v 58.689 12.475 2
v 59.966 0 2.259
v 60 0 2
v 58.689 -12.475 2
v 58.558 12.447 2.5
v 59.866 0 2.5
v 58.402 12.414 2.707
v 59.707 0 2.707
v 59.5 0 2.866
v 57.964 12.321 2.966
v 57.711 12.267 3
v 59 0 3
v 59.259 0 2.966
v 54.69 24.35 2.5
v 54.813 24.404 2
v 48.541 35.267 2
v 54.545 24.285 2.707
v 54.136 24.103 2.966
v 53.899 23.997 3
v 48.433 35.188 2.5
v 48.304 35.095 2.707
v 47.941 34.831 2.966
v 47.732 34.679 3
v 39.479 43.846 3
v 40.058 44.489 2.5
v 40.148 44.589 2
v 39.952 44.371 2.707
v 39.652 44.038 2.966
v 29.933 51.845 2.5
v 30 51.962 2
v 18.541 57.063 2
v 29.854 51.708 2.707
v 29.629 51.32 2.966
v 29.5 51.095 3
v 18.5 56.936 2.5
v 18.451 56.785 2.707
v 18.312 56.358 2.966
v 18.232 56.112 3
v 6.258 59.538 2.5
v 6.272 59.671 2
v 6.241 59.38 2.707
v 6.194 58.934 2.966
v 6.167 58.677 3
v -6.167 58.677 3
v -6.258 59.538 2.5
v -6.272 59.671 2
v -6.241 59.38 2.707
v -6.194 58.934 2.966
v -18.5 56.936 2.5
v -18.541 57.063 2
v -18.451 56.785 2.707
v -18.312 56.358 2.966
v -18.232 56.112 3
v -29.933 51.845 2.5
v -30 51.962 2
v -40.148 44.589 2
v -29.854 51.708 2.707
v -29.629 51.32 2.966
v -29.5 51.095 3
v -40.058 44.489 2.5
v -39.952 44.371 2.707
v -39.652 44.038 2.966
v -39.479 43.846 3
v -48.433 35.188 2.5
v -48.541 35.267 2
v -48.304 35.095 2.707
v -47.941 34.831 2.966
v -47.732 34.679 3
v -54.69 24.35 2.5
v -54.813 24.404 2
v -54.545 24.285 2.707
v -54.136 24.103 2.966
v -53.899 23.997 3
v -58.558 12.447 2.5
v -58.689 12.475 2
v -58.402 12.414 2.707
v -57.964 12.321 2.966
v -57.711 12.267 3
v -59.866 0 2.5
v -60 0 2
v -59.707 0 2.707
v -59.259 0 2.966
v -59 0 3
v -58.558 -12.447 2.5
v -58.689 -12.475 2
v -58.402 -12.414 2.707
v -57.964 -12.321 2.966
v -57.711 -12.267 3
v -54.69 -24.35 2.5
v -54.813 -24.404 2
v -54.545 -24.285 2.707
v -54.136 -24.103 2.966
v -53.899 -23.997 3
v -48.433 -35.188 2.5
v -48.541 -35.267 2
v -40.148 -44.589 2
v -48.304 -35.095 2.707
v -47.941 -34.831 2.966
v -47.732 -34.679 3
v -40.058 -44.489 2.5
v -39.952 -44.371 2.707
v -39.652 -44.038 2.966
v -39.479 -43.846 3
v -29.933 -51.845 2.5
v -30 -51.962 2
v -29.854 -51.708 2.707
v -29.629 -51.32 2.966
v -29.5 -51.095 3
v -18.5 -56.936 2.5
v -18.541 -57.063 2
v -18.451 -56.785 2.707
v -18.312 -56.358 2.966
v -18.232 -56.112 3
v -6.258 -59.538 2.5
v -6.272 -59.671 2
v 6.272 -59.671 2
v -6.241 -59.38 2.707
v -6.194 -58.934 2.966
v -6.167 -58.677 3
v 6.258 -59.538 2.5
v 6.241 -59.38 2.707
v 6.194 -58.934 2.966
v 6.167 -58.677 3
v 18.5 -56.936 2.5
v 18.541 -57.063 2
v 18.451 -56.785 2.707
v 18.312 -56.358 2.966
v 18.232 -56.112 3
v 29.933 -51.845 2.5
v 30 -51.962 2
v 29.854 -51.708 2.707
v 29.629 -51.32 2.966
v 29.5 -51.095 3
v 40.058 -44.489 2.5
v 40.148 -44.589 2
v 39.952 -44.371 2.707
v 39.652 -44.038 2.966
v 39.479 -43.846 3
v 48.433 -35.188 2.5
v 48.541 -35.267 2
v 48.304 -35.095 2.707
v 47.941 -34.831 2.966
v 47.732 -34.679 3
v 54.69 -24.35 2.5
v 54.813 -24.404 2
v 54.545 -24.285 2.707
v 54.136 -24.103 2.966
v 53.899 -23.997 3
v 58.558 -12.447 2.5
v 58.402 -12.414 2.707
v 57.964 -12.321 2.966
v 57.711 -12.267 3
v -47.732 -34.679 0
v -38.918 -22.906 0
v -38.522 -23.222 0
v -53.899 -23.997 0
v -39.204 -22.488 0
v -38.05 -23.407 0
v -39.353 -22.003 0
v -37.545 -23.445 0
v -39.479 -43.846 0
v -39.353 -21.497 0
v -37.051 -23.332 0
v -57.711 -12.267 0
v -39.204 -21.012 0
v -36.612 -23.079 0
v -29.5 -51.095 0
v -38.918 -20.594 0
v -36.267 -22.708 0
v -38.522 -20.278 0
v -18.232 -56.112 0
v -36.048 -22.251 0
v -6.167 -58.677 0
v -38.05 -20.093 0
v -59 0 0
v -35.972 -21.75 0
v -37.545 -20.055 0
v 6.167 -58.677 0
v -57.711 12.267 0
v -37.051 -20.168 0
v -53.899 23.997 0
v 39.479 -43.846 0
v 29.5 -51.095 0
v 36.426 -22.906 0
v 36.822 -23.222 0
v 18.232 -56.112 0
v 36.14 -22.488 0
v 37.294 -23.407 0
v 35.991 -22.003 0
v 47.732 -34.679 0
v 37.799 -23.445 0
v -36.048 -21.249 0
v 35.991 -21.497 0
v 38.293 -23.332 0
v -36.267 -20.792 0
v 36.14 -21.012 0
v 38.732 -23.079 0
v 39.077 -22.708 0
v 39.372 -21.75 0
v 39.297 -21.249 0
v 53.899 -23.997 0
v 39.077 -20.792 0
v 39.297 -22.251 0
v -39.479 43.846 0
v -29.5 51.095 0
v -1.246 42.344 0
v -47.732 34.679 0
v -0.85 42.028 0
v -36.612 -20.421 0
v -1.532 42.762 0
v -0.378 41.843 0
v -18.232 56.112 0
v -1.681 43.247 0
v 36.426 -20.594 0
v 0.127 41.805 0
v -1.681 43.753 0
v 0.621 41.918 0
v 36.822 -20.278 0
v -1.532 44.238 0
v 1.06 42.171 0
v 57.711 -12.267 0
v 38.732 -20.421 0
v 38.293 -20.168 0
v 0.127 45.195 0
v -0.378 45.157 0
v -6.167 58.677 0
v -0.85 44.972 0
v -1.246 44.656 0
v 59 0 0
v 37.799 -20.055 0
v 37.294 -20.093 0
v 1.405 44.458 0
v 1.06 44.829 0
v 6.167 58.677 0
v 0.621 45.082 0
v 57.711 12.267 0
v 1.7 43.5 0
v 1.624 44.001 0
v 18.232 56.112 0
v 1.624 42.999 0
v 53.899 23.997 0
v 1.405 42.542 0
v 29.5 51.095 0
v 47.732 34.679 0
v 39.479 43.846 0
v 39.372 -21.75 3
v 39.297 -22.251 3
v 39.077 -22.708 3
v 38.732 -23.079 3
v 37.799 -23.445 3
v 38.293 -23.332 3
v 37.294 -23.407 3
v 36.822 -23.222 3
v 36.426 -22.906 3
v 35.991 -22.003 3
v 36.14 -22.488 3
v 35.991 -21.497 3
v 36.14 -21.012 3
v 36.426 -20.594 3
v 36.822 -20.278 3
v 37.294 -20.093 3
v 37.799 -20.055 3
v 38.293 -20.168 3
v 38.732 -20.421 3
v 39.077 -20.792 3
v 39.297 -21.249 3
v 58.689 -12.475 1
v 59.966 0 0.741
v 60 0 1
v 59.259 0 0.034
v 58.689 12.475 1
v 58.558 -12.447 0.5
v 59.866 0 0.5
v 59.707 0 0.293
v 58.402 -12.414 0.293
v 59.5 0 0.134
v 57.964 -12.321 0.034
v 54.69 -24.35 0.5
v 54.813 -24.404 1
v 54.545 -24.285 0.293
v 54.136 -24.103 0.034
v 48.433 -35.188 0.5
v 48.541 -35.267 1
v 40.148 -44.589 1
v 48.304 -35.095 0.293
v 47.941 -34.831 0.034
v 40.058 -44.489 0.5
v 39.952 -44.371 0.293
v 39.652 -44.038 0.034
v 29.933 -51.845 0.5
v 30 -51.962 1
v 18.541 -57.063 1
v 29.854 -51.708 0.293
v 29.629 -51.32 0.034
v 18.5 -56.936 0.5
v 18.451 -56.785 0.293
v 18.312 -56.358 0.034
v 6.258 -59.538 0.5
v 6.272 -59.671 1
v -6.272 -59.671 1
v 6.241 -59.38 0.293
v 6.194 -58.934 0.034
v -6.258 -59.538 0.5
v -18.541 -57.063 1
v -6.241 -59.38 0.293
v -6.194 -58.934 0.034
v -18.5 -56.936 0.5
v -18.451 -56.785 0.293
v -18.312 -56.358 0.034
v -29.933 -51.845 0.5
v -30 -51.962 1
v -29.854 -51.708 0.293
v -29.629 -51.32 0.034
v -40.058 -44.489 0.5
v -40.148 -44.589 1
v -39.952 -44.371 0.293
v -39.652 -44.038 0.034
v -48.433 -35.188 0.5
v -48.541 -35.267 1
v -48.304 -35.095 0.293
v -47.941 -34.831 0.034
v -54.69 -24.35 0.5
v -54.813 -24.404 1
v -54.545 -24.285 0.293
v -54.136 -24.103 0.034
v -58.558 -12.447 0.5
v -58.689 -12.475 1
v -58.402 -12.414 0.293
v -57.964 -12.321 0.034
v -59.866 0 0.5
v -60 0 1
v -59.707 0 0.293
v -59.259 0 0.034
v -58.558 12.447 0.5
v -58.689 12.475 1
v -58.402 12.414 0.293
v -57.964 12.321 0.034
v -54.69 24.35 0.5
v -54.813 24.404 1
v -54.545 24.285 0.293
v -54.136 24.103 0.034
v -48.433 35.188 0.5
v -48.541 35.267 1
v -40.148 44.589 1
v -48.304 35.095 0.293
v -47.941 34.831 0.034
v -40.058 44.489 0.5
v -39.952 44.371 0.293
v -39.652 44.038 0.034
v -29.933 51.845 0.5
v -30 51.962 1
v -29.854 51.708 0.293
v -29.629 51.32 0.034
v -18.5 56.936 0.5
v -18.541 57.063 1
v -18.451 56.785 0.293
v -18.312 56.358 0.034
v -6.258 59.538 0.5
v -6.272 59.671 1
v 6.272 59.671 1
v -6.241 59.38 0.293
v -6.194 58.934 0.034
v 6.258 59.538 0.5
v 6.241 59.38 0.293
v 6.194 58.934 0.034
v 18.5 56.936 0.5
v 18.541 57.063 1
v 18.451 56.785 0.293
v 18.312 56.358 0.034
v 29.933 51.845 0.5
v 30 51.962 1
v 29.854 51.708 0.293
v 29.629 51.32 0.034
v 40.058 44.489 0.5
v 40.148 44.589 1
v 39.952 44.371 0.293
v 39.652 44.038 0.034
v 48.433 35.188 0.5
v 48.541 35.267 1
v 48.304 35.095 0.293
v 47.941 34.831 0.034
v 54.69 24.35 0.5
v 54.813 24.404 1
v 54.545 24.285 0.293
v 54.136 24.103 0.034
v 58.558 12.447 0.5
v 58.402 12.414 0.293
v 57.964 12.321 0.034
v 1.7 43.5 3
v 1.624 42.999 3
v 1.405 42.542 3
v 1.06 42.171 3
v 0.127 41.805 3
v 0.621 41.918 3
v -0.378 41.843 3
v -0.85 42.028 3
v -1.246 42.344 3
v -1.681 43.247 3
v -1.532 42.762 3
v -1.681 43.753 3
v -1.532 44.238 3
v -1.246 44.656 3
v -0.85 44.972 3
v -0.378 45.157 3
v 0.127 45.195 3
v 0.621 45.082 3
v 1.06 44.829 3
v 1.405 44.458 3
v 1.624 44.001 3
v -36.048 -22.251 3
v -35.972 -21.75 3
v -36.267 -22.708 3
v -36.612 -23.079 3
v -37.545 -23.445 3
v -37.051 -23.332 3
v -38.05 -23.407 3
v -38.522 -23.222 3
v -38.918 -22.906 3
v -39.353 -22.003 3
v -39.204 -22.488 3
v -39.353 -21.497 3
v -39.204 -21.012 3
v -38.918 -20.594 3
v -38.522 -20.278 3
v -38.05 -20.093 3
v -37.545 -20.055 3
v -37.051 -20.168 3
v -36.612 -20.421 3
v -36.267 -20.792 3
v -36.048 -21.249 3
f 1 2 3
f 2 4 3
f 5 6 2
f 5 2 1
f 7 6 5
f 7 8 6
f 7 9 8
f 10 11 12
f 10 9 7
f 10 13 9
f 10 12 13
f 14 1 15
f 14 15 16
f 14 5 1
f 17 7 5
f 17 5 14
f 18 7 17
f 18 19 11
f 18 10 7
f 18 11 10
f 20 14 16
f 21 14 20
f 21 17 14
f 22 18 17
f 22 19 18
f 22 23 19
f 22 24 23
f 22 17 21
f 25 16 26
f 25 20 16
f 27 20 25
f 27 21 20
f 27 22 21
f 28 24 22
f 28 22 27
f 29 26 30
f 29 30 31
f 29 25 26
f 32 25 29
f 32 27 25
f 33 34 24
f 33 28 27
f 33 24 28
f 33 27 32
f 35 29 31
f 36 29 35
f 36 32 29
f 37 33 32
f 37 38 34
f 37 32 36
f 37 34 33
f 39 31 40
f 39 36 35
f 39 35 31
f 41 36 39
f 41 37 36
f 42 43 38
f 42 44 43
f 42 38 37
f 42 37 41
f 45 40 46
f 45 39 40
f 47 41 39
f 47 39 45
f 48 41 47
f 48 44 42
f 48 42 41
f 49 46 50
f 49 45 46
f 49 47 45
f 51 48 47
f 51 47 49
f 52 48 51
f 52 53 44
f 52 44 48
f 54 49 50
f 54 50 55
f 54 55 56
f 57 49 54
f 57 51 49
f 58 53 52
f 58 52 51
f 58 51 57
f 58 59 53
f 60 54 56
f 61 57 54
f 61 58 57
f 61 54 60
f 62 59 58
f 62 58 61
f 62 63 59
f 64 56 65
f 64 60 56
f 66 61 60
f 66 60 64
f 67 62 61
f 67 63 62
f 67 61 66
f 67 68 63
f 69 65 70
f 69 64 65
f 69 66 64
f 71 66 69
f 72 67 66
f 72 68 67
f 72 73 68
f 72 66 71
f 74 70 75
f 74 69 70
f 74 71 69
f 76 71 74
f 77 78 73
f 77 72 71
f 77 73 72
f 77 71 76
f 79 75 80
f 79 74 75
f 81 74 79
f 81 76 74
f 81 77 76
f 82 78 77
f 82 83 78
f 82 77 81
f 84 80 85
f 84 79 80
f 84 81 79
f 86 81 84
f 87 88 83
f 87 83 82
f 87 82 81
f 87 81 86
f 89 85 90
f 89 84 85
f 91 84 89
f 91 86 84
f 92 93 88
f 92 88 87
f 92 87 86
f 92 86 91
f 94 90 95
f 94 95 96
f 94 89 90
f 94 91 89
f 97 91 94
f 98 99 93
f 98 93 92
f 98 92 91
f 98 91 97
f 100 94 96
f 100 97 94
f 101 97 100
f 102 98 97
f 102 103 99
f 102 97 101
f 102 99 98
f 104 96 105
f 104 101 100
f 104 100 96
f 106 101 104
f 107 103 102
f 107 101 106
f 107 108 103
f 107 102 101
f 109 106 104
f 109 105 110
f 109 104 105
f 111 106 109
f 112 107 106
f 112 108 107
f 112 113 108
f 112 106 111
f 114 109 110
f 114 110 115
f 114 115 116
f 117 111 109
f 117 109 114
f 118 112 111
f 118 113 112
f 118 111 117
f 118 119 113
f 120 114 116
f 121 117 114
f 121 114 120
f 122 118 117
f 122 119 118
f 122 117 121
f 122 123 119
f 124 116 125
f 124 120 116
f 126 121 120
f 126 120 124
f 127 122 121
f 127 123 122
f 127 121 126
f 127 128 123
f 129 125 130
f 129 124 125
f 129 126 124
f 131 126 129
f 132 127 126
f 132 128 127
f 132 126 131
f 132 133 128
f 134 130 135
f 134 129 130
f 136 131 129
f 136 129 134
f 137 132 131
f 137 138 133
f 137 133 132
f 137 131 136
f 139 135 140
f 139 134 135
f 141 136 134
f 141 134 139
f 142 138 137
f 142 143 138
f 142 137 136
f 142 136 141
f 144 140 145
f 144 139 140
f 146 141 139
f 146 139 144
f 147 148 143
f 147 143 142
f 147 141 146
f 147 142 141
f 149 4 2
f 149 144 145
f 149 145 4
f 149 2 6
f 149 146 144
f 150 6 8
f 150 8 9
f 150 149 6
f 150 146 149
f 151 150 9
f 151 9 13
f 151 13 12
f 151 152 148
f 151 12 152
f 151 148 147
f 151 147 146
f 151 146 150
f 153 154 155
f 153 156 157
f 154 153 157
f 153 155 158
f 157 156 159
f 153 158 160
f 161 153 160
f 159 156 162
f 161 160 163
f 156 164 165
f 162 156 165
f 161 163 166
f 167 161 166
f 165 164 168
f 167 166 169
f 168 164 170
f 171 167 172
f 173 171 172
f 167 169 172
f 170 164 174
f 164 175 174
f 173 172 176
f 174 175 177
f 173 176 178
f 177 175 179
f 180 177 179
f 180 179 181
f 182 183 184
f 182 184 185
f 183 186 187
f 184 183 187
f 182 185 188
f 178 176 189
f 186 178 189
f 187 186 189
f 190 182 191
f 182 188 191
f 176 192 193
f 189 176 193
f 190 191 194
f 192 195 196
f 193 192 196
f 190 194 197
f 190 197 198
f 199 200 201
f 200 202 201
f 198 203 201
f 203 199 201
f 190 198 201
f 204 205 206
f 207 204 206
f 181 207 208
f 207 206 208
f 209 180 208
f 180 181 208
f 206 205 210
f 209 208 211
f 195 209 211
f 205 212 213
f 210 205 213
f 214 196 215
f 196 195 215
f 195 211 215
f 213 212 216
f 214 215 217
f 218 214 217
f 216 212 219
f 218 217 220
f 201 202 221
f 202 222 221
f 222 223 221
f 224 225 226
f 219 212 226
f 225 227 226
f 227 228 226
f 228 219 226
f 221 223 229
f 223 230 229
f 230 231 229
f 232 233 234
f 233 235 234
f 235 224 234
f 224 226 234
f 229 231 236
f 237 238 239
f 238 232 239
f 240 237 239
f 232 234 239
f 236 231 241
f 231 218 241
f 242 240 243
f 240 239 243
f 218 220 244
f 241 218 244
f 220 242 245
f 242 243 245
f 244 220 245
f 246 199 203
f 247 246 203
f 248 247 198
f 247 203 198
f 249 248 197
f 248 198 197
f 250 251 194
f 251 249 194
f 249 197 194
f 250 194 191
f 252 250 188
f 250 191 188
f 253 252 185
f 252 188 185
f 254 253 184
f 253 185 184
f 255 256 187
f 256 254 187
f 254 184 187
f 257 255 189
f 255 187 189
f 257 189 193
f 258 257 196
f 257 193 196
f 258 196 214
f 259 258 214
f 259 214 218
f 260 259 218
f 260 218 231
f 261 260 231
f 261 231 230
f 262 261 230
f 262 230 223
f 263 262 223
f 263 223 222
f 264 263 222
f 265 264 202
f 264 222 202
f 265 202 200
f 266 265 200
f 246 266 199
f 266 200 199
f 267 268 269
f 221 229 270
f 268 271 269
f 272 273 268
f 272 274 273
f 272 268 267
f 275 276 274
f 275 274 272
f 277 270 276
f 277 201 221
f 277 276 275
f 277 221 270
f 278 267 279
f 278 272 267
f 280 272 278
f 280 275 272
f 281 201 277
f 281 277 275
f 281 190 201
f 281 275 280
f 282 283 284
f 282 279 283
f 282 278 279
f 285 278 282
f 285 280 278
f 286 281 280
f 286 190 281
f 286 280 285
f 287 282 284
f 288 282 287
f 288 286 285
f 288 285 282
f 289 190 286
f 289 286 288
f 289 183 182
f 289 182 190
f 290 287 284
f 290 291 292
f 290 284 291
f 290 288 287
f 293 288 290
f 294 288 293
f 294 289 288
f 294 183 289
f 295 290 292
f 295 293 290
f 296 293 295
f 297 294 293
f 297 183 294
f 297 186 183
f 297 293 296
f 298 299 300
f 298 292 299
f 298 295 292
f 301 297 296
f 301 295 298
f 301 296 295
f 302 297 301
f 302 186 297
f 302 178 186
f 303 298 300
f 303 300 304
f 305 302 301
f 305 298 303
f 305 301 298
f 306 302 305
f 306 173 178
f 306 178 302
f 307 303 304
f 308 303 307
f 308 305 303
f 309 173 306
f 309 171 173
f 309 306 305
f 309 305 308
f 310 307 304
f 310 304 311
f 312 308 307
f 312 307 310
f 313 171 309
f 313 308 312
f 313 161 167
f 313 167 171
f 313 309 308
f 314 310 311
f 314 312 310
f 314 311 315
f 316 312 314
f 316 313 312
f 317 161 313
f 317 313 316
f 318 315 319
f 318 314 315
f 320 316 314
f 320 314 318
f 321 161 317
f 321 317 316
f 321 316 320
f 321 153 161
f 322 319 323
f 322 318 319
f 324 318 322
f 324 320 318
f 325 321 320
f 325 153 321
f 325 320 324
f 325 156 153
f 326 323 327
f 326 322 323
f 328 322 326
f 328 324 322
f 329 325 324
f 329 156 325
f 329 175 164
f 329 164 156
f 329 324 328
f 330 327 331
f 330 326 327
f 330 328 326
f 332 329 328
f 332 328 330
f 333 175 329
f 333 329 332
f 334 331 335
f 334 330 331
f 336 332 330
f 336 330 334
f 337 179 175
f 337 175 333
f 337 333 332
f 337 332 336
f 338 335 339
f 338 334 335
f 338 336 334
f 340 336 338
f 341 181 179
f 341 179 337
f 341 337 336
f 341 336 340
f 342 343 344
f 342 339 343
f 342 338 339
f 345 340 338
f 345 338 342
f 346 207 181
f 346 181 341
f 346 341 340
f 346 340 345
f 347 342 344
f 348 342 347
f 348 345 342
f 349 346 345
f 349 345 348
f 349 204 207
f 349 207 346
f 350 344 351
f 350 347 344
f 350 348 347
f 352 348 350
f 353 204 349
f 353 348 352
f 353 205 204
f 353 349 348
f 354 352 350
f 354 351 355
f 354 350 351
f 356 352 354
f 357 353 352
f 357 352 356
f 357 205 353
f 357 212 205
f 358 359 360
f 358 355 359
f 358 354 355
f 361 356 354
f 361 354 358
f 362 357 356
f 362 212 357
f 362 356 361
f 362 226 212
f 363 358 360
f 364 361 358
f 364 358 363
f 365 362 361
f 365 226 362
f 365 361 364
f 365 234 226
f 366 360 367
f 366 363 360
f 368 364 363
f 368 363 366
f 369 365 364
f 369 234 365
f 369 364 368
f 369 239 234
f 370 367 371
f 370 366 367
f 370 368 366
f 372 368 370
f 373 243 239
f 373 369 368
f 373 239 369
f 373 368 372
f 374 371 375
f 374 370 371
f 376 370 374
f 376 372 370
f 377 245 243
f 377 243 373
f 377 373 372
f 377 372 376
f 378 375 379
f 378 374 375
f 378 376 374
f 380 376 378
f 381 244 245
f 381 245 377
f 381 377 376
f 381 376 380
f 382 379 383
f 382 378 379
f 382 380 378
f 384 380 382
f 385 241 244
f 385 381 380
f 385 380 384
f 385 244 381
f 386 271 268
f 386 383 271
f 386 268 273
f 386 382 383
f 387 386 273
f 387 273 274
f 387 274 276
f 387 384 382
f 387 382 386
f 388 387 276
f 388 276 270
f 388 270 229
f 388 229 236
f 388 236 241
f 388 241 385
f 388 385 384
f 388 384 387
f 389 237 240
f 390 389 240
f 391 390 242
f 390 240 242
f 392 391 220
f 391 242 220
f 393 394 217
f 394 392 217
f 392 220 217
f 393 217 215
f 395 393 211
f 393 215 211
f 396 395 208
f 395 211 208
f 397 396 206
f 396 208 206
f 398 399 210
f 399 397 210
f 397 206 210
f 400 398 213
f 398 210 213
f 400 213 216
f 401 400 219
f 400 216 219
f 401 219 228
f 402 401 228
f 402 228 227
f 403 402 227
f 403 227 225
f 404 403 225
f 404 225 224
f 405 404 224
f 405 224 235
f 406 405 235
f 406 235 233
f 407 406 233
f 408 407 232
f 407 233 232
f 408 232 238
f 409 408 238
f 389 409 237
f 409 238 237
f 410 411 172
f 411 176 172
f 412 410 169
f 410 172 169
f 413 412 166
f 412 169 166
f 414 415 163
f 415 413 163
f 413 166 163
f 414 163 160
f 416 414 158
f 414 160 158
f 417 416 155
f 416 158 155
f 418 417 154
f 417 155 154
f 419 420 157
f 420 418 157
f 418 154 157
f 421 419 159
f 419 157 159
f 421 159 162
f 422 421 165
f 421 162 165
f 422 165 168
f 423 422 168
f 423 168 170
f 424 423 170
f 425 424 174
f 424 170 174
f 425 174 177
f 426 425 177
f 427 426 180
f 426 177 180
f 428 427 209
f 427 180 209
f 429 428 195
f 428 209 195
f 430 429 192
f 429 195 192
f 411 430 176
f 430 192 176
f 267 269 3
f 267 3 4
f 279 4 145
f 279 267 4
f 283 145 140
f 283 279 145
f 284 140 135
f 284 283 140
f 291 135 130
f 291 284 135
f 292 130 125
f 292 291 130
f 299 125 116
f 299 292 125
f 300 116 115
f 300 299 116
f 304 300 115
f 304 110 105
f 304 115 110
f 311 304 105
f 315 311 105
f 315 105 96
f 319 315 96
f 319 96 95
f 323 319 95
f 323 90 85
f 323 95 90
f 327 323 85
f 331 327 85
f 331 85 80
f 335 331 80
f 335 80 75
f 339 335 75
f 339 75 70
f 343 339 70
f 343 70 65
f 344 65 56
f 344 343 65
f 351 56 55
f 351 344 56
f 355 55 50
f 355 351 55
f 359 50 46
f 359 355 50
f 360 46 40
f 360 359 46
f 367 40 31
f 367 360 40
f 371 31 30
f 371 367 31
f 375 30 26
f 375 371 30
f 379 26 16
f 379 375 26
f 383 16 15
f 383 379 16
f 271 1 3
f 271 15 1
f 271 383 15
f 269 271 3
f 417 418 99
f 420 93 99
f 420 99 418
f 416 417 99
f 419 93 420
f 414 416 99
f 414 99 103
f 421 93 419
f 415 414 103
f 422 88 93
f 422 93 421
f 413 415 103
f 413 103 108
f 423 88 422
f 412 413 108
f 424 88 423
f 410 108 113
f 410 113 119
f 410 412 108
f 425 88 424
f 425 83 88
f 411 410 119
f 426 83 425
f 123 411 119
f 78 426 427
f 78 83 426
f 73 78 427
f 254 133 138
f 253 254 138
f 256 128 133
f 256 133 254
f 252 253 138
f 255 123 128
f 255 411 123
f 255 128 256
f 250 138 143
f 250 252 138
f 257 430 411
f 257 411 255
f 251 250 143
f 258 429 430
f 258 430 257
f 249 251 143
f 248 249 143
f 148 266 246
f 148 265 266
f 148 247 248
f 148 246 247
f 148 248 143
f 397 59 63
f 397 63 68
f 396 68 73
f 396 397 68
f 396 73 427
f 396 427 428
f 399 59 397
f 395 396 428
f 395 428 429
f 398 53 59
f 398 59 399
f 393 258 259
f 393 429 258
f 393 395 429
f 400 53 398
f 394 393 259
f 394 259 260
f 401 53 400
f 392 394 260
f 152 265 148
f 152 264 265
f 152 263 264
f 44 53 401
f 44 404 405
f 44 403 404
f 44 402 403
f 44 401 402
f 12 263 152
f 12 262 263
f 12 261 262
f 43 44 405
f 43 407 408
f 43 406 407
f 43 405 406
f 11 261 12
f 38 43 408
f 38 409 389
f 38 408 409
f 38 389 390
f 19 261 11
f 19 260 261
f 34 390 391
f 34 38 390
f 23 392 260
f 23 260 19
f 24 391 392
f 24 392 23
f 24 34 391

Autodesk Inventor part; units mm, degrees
ref_plane "YZ Plane" through (0, 0, 0) normal (1, 0, 0) x (0, 1, 0)
ref_plane "XZ Plane" through (0, 0, 0) normal (0, 1, 0) x (-1, 0, 0)
ref_plane "XY Plane" through (0, 0, 0) normal (0, 0, 1) x (1, 0, 0)
sketch "Skizze1" plane through (0, 0, 0) normal (0, 0, 1) x (1, 0, 0)
  circle A0 centre (0, 0) radius 60
  circle A1 centre (0, 0) radius 43.5 construction
  circle A2 centre (0, 43.5) radius 1.7
  circle A3 centre (37.6721, -21.75) radius 1.7
  circle A4 centre (-37.6721, -21.75) radius 1.7
  line L0 (0, 0) -> (37.6721, -21.75) construction
  line L1 (0, 0) -> (-37.6721, -21.75) construction
  line L2 (0, 84) -> (0, -84) construction
  line L3 (-84, 0) -> (84, 0) construction
  dimension "d0" = 120
  dimension "d1" = 87
  dimension "d2" = 3.4
  dimension "d3" = 120
extrude "Extrusion1" add sketch "Skizze1" along normal blind 3
fillet "Rundung1" radius 1 2 edges at (-60, 0, 3) (-60, 0, 0)
properties part number "Base-Plate"
